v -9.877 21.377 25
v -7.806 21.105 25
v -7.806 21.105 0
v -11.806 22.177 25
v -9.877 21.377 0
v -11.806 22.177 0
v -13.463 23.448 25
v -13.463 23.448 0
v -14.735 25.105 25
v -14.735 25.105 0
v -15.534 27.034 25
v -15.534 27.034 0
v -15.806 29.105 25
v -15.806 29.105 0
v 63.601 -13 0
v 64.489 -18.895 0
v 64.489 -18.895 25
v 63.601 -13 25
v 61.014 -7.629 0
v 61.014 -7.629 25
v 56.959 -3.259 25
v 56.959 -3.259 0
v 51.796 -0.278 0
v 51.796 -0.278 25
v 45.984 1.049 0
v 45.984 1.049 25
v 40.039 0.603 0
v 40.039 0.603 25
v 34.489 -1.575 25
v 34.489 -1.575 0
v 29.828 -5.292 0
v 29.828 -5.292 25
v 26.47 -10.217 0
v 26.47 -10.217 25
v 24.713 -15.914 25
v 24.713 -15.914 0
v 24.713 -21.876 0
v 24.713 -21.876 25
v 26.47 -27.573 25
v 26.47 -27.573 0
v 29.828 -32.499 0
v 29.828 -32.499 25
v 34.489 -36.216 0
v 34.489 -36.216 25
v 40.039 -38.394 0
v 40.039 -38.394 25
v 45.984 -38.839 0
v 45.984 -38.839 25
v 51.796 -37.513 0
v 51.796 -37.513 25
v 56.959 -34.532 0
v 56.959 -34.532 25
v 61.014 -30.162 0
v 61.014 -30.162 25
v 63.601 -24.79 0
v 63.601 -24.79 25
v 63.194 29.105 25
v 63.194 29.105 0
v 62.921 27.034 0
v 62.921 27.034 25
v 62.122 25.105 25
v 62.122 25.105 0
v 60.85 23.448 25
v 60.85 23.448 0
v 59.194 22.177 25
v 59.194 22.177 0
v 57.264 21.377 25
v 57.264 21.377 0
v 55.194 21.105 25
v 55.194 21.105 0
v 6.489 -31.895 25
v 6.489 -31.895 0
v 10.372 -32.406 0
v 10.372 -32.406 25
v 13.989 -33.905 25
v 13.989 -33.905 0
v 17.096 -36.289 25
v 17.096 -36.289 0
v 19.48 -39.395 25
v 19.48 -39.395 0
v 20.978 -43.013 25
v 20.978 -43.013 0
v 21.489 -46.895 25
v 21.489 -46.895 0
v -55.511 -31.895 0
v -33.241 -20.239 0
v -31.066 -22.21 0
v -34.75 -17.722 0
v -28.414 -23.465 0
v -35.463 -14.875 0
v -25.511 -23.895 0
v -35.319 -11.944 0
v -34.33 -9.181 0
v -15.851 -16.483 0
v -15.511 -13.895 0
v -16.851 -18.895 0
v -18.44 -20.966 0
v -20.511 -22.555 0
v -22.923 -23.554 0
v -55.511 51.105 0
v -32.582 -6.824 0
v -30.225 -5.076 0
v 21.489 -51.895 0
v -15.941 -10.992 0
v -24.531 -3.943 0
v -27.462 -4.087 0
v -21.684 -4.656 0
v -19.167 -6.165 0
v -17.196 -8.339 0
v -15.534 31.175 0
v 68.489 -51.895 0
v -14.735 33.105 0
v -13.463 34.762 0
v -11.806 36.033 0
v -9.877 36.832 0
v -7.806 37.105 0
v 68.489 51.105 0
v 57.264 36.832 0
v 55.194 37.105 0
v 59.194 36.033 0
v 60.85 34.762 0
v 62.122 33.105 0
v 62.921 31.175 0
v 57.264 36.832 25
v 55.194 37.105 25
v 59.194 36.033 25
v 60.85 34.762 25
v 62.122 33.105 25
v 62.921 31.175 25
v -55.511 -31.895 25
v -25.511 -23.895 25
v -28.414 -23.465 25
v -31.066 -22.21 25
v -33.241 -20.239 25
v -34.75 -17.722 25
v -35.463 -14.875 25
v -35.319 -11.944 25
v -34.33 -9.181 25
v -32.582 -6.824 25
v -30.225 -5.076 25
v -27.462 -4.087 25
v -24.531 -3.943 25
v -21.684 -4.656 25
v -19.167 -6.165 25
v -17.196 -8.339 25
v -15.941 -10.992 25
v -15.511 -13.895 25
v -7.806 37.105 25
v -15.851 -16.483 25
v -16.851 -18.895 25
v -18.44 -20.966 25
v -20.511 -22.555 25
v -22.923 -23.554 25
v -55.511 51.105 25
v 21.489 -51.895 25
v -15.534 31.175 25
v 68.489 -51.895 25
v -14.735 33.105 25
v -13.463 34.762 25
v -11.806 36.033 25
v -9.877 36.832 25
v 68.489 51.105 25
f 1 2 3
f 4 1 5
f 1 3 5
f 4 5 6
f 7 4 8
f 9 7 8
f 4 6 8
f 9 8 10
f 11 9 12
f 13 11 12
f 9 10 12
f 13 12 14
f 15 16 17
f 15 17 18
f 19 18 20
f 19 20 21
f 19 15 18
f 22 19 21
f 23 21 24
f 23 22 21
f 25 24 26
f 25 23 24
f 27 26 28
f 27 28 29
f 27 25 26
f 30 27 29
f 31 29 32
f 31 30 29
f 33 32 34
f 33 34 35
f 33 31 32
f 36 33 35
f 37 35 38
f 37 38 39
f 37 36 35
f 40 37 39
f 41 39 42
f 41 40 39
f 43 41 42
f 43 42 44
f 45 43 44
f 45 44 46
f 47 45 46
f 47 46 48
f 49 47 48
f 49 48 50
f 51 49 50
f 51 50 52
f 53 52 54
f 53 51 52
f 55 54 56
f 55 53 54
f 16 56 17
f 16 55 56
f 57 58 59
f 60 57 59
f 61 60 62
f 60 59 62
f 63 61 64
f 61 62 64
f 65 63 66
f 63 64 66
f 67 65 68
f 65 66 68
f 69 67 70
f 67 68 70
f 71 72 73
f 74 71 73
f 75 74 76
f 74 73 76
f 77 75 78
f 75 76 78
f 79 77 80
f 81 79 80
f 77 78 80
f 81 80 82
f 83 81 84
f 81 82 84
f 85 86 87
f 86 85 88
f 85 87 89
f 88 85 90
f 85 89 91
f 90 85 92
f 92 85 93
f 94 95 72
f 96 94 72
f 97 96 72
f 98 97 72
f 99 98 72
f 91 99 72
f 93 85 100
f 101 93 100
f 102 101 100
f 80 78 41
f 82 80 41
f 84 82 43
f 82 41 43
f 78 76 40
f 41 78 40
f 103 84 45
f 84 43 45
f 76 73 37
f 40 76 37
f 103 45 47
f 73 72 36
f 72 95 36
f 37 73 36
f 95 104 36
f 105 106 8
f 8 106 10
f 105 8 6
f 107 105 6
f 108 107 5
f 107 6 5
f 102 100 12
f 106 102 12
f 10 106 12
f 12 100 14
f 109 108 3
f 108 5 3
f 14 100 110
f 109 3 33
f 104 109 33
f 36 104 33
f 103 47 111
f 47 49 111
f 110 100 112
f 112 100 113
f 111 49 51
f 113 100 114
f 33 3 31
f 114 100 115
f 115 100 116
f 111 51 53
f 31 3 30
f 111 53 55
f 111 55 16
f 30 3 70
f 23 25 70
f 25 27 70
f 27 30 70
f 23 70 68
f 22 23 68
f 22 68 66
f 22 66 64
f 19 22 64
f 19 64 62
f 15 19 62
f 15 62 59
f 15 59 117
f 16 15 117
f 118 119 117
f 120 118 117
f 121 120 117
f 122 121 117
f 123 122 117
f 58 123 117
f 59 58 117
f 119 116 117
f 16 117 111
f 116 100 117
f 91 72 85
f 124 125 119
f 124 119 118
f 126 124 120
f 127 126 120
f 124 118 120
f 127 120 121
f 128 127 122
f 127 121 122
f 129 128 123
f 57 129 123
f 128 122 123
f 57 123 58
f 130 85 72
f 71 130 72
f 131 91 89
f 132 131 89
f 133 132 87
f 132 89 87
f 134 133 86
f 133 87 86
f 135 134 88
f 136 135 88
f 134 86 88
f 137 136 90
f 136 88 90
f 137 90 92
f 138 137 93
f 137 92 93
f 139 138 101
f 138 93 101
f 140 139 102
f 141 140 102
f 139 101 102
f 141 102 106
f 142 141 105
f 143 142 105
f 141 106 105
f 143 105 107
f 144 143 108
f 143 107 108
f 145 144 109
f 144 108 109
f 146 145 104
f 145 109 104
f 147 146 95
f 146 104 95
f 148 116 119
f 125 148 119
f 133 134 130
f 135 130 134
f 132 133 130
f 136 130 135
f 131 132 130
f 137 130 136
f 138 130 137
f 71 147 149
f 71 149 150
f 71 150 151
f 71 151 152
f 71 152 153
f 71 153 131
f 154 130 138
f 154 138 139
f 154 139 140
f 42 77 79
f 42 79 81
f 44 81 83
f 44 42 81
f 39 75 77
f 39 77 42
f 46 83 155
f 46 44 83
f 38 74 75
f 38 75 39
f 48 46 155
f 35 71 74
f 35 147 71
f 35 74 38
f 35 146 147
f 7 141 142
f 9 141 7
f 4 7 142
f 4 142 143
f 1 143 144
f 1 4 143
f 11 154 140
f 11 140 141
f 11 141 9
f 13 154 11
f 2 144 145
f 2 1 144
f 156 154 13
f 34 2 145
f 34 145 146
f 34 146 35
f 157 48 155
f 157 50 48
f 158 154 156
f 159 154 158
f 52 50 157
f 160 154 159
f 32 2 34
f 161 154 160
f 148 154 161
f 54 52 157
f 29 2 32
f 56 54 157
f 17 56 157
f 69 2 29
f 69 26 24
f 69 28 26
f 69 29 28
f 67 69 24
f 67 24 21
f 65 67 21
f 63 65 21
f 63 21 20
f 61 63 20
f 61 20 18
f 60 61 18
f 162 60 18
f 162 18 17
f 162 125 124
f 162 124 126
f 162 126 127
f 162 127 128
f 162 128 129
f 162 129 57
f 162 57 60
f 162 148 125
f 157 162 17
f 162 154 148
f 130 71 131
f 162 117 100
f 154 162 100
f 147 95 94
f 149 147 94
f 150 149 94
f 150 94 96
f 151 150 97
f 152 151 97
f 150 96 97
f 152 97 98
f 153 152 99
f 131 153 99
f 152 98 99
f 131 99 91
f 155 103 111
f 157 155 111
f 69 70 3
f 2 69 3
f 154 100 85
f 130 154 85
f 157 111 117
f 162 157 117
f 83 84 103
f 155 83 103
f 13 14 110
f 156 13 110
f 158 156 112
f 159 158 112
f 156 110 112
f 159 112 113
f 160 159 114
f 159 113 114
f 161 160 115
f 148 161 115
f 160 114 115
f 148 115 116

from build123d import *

# Parameters (mm, degrees)
F0_R     = 20
F1_DEPTH = 25


with BuildPart() as f1:
    # F0 (on Top) → F1 (new body)
    with BuildSketch(Plane.XY):
        with Locations((44.489244, -18.895161)):
            Circle(F0_R)
        with BuildLine():
            ThreePointArc((-15.510756, -13.895161), (-32.581823, -6.824093), (-25.510756, -23.895161))
            ThreePointArc((-25.510756, -23.895161), (-18.439688, -20.966228), (-15.510756, -13.895161))
        make_face()
        with BuildLine():
            Line((21.489244, -51.895161), (68.489244, -51.895161))
            Line((68.489244, -51.895161), (68.489244, -18.895161))
            Line((68.489244, -18.895161), (68.489244, 51.104839))
            Line((68.489244, 51.104839), (63.193549, 51.104839))
            Line((63.193549, 51.104839), (-55.510756, 51.104839))
            Line((-55.510756, 51.104839), (-55.510756, -31.895161))
            Line((-55.510756, -31.895161), (-25.510756, -31.895161))
            Line((-25.510756, -31.895161), (6.489244, -31.895161))
            ThreePointArc((6.489244, -31.895161), (17.095846, -36.288559), (21.489244, -46.895161))
            Line((21.489244, -46.895161), (21.489244, -51.895161))
        make_face()
        with BuildLine():
            ThreePointArc((-15.510756, -13.895161), (-18.439688, -20.966228), (-25.510756, -23.895161))
            ThreePointArc((-25.510756, -23.895161), (-32.581823, -6.824093), (-15.510756, -13.895161))
        make_face(mode=Mode.SUBTRACT)
        with Locations((44.489244, -18.895161)):
            Circle(F0_R, mode=Mode.SUBTRACT)
        with BuildLine():
            ThreePointArc((63.193549, 29.104839), (60.850403, 23.447985), (55.193549, 21.104839))
            Line((55.193549, 21.104839), (-7.806451, 21.104839))
            ThreePointArc((-7.806451, 21.104839), (-13.463306, 23.447985), (-15.806451, 29.104839))
            ThreePointArc((-15.806451, 29.104839), (-13.463306, 34.761694), (-7.806451, 37.104839))
            Line((-7.806451, 37.104839), (55.193549, 37.104839))
            ThreePointArc((55.193549, 37.104839), (60.850403, 34.761694), (63.193549, 29.104839))
        make_face(mode=Mode.SUBTRACT)
    extrude(amount=F1_DEPTH)


solid = f1.part
